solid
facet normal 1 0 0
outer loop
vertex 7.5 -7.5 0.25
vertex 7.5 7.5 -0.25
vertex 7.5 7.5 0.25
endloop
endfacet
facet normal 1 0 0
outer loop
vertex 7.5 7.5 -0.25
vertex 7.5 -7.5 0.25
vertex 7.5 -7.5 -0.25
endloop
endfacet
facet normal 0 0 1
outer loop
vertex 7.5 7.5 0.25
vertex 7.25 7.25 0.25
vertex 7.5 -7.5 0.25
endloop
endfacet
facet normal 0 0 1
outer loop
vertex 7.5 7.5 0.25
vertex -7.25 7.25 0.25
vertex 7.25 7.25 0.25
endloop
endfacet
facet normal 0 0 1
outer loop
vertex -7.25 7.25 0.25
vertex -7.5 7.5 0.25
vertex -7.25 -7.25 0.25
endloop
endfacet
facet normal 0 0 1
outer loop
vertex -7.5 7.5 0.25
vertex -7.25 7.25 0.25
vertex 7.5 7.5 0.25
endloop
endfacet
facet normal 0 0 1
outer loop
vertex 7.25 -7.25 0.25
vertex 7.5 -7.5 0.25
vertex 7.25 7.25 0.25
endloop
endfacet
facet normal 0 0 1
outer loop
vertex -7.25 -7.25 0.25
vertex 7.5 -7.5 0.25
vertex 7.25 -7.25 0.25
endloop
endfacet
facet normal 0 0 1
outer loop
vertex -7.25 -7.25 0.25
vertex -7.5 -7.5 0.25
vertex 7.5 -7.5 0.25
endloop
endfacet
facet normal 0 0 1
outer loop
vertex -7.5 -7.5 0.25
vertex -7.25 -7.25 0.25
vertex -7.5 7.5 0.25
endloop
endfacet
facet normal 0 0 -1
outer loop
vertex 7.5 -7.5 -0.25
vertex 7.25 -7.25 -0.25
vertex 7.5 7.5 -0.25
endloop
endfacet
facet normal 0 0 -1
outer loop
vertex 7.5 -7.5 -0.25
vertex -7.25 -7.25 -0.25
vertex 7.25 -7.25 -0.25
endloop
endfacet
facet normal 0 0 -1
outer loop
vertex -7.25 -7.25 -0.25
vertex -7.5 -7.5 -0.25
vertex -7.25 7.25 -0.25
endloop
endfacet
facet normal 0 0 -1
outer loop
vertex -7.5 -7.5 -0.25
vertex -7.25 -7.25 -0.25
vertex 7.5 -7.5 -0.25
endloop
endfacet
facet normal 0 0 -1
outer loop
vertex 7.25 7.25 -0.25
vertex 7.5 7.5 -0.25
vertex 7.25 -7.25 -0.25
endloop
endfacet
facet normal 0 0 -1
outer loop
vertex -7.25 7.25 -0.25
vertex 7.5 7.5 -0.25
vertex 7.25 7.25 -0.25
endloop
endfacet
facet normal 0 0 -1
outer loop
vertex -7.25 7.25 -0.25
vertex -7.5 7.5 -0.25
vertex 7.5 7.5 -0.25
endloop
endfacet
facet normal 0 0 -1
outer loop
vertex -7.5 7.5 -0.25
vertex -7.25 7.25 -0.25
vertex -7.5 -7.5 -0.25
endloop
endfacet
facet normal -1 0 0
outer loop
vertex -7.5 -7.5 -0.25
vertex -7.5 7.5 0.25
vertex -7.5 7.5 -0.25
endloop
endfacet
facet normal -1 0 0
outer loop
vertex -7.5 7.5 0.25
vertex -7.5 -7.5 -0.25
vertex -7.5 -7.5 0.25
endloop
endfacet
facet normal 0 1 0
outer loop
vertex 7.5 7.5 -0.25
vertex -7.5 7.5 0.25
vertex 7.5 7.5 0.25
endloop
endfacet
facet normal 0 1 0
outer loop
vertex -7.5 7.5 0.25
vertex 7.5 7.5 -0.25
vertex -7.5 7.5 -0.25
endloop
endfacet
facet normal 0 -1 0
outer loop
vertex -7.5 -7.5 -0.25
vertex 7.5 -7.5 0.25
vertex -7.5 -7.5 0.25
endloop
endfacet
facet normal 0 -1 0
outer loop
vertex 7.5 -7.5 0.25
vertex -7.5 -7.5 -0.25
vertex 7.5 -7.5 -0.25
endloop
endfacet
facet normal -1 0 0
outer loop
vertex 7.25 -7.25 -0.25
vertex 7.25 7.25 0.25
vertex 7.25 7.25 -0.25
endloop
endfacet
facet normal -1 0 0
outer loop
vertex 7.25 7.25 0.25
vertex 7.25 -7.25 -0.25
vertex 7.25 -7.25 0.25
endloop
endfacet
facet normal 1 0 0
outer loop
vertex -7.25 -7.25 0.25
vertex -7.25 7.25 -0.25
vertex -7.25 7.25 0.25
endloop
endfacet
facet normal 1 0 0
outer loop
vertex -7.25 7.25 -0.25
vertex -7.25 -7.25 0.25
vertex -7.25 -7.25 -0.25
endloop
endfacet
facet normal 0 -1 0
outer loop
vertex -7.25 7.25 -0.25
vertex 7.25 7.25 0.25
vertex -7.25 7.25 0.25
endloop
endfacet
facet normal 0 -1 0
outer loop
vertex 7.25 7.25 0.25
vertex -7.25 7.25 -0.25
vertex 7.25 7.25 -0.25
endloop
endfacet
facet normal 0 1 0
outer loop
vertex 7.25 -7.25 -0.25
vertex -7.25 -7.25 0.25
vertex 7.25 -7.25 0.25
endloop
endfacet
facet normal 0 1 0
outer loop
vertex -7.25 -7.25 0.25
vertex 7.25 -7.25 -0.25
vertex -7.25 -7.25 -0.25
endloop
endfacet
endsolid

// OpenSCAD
difference(){
    cube([15, 15, 0.5], center = true);
    cube([14.5, 14.5, 1], center =true);
}
